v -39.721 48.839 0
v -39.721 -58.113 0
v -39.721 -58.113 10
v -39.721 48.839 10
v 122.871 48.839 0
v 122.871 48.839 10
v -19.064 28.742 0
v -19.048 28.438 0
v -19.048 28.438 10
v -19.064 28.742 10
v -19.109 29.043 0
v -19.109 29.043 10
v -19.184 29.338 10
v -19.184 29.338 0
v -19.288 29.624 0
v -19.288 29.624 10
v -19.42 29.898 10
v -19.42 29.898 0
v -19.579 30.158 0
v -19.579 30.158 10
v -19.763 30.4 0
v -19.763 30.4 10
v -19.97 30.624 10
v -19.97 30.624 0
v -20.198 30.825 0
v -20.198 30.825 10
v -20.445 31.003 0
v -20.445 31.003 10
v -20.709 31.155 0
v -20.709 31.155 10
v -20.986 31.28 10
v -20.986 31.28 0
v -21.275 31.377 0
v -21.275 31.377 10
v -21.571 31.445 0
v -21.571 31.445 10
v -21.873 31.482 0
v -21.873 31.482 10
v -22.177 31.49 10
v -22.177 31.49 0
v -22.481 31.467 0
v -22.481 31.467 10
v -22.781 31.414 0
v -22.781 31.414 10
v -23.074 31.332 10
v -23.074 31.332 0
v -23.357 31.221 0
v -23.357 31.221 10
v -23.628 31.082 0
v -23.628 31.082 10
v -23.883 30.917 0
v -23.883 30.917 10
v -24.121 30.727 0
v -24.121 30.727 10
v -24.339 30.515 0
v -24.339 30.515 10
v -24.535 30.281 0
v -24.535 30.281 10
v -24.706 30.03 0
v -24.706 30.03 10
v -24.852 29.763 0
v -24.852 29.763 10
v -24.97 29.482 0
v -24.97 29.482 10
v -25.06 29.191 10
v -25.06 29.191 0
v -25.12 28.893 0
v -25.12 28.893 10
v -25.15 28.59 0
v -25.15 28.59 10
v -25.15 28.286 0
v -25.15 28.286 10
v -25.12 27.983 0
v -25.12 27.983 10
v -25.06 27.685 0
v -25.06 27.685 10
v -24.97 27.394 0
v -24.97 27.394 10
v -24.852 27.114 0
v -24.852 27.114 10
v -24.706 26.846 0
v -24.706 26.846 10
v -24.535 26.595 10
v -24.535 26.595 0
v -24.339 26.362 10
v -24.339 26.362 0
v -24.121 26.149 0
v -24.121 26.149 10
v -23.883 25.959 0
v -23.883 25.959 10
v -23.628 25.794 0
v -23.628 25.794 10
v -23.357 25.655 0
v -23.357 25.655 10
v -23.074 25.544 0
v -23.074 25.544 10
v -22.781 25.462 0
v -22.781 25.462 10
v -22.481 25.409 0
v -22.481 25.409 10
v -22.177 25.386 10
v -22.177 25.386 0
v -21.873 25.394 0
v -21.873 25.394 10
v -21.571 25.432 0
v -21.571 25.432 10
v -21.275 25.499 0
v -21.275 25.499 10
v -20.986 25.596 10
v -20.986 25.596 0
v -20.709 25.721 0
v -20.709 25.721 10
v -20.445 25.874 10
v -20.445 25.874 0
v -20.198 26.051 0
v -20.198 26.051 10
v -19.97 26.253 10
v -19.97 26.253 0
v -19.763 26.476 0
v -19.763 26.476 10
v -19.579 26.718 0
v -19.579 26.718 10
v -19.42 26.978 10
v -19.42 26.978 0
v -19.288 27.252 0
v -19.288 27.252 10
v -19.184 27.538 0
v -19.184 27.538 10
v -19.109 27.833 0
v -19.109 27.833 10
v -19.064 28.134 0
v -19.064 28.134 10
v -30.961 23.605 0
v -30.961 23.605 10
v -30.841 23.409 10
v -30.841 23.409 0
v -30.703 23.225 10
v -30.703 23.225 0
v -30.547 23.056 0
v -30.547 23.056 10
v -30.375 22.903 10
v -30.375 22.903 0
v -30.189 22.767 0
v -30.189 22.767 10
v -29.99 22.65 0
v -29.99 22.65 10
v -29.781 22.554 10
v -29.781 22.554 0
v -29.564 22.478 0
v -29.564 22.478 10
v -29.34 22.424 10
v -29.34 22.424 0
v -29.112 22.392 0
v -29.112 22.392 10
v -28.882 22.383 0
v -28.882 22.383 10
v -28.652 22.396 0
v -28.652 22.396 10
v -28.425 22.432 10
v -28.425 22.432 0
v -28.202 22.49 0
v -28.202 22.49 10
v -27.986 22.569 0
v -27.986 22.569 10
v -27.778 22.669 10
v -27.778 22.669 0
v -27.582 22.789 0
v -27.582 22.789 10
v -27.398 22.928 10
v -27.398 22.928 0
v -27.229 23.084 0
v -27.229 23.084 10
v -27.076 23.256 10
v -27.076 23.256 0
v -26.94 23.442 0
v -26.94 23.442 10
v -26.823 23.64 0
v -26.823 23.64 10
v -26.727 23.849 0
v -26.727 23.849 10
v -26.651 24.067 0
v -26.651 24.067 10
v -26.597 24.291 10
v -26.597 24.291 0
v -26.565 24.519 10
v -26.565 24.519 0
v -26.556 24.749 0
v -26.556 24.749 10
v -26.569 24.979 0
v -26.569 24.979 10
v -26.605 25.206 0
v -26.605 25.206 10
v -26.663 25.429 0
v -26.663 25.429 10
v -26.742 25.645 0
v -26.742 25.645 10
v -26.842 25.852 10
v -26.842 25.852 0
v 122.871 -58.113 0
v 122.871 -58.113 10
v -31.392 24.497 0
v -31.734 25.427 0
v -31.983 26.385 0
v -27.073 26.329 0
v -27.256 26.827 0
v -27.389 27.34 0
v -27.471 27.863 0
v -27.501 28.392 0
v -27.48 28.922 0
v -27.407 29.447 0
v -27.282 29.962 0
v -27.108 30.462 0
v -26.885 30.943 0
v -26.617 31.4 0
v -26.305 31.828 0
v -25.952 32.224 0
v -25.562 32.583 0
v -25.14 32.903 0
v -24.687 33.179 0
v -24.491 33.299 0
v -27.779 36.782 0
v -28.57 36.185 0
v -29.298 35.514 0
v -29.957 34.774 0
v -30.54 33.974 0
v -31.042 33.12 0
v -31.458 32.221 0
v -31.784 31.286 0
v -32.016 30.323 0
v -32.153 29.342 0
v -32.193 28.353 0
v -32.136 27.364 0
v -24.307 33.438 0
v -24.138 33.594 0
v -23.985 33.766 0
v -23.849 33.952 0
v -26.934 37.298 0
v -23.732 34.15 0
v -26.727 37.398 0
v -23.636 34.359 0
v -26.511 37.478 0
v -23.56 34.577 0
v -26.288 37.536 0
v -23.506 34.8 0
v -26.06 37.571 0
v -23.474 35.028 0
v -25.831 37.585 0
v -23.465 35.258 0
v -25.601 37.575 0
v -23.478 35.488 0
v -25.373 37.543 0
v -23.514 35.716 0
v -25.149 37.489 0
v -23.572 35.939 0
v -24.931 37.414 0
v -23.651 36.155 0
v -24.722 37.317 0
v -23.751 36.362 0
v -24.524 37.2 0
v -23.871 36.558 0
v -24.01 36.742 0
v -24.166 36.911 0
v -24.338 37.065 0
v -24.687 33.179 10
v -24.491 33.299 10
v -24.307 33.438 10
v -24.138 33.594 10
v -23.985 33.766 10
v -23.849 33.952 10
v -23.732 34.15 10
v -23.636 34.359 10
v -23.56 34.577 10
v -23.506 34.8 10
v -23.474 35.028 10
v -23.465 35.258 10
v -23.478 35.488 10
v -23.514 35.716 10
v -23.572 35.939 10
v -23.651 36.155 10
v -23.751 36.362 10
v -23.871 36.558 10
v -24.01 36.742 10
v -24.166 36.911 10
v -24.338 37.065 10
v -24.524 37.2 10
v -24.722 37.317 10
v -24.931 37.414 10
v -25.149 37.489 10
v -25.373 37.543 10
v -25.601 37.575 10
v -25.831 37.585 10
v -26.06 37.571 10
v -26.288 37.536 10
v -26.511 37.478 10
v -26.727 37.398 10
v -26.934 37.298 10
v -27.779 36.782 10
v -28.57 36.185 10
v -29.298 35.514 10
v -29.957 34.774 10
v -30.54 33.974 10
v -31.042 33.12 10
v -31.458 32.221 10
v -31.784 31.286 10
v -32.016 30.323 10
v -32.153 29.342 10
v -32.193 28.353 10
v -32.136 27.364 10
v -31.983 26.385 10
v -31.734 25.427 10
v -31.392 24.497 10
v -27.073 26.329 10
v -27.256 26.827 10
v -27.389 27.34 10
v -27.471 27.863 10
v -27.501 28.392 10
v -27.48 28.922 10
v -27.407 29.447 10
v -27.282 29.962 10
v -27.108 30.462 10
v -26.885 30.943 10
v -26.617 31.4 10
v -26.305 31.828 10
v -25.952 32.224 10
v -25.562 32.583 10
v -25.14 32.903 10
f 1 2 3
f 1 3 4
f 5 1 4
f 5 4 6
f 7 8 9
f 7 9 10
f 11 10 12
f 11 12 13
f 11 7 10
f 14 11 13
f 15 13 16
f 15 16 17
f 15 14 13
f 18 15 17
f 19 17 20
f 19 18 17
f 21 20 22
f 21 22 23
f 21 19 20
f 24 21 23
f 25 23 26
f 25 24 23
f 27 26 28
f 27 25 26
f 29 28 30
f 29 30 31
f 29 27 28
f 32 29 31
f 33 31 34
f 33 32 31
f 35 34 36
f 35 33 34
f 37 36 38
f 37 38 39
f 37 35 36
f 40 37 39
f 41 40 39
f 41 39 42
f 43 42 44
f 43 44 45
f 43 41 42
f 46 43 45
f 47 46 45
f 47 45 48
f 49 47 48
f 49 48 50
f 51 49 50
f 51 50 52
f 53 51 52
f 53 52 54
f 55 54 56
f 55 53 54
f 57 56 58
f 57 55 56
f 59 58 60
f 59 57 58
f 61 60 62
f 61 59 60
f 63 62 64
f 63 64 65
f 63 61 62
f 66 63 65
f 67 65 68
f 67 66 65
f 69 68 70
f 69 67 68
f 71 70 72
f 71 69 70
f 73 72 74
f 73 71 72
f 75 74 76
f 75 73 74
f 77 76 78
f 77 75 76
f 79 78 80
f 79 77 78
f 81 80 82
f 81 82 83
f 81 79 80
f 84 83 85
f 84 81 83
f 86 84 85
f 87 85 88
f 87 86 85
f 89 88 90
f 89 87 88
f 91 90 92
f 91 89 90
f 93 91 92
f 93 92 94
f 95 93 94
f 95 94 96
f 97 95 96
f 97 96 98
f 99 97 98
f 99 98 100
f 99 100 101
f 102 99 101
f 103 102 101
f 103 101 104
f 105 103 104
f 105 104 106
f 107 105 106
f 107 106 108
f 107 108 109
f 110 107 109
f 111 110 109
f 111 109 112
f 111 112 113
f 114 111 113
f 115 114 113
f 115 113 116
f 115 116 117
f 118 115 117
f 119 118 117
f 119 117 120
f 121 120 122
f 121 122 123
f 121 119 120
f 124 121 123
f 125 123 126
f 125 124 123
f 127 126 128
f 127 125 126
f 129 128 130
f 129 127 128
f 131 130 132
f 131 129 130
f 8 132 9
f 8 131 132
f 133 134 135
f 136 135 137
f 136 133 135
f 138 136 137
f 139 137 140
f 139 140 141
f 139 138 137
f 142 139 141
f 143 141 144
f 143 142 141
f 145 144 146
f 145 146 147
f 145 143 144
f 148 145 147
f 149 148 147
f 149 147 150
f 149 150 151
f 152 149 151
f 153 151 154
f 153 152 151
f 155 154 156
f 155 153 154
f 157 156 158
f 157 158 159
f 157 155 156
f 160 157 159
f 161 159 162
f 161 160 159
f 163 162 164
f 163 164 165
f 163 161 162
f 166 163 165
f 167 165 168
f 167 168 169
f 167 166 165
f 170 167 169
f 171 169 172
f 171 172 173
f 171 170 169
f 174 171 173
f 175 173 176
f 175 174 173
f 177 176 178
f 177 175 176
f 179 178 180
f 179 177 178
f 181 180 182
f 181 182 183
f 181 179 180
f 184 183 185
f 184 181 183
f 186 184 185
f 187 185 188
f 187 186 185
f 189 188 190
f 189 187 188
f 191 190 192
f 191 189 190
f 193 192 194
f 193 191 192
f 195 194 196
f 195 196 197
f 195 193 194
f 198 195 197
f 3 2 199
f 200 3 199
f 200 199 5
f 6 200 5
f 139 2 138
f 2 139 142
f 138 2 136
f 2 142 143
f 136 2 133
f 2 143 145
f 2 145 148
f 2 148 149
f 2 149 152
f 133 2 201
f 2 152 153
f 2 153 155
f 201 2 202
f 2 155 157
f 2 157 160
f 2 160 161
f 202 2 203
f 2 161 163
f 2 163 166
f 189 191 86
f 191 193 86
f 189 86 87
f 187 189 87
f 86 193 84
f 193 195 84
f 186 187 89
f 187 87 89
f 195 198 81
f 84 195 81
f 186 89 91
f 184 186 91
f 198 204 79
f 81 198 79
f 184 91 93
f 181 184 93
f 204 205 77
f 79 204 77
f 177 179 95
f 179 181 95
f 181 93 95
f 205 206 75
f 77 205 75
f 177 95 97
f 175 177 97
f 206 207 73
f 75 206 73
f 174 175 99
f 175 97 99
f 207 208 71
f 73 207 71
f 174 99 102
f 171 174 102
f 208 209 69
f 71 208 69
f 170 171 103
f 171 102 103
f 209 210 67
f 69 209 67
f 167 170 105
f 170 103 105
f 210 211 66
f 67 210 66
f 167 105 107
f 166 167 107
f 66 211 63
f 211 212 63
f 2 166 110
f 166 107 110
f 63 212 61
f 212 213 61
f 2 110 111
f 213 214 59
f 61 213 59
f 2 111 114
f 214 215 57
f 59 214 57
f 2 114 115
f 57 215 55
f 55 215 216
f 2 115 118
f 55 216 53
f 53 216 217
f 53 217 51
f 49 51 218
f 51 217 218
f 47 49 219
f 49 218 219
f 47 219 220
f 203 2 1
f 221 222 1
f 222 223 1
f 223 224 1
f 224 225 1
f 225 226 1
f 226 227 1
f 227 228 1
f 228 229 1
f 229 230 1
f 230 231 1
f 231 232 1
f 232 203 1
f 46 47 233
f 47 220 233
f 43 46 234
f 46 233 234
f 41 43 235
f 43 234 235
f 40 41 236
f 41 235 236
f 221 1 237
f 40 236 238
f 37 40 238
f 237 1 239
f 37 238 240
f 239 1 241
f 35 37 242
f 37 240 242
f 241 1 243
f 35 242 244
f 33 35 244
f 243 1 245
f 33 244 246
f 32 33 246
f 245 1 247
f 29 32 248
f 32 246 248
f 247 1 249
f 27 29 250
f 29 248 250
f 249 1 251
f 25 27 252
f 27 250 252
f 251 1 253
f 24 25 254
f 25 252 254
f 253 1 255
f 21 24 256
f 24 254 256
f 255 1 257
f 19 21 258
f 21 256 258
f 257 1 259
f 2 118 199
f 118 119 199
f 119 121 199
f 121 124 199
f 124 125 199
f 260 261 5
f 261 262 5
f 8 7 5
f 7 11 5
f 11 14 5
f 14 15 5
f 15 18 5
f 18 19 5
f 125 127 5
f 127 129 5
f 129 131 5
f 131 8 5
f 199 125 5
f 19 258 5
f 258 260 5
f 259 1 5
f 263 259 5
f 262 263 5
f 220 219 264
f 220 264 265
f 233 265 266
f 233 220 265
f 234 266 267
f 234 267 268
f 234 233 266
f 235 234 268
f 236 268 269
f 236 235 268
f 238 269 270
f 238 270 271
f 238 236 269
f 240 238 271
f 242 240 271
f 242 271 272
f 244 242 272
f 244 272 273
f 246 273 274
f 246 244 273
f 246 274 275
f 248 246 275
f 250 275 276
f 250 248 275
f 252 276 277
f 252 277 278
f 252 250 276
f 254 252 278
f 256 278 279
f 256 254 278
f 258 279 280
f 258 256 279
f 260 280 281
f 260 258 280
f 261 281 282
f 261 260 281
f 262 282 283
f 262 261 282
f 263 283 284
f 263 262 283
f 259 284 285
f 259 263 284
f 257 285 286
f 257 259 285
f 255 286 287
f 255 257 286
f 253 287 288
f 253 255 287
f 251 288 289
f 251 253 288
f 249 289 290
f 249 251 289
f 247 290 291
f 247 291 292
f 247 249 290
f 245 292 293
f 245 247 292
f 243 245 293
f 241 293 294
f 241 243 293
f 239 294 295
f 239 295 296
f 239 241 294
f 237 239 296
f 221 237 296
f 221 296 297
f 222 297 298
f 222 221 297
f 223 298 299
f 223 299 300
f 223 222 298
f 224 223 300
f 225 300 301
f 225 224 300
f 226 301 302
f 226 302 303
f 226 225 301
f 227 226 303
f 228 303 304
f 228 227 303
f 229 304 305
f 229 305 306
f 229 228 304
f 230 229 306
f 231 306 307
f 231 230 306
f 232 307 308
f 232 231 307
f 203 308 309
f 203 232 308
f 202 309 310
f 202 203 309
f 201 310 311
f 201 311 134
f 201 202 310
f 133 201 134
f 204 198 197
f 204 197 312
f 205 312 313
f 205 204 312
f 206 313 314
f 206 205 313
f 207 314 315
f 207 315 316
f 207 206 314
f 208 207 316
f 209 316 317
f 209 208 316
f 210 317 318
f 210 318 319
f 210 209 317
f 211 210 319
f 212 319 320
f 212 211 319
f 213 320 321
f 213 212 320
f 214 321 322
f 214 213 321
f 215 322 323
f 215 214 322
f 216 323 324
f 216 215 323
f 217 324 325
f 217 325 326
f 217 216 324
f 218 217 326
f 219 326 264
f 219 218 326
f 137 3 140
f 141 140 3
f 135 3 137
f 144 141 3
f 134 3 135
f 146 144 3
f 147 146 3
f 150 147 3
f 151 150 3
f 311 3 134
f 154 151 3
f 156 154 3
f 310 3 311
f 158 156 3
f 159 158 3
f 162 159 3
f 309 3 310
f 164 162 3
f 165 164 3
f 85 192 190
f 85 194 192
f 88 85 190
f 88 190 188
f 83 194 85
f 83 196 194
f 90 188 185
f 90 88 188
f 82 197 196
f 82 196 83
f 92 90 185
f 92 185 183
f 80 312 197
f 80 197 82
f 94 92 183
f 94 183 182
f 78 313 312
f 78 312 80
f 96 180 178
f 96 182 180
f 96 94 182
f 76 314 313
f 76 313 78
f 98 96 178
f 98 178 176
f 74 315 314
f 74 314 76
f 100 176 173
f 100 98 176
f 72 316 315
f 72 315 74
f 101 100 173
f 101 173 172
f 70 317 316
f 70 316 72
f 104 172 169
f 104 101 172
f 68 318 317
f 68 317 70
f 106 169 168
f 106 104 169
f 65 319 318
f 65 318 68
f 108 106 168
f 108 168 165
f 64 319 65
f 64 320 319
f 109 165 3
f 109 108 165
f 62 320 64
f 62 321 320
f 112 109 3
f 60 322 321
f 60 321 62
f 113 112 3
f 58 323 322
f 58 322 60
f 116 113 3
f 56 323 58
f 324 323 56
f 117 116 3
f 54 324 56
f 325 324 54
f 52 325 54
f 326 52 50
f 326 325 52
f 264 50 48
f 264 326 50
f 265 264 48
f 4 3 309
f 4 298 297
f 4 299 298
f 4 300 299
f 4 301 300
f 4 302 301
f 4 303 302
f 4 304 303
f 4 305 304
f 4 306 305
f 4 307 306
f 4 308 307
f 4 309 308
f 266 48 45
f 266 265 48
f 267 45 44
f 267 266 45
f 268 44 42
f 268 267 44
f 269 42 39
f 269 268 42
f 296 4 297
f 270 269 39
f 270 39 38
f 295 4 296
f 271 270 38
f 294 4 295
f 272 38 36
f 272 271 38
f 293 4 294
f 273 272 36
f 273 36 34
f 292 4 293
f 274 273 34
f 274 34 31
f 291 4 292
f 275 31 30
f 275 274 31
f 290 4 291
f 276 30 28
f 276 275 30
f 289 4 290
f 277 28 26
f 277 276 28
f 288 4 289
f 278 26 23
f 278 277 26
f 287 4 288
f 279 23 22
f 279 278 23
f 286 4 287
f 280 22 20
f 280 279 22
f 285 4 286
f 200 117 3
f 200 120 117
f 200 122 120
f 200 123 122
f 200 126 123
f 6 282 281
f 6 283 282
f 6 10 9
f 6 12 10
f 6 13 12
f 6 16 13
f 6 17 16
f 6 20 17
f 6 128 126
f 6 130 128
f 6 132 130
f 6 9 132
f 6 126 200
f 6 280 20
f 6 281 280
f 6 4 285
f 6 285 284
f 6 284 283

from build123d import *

# Parameters (mm, degrees)
F_1_FR_W        = 162.591921451
F_1_FR_H        = 106.952100423
F_1_FR_R        = 3.052899236
EXTRUDE_1_DEPTH = 10


with BuildPart() as part:
    # Эскиз1_fr → Бобышка-Вытянуть1 (new body)
    with BuildSketch(Plane.XY):
        with Locations((41.575310714, -4.636651753)):
            Rectangle(F_1_FR_W, F_1_FR_H)
        with Locations((-22.101373353, 28.438130748)):
            Circle(F_1_FR_R, mode=Mode.SUBTRACT)
        with BuildLine():
            ThreePointArc((-26.934111294, 37.298150306), (-31.783615034, 31.28584889), (-30.961392911, 23.605392807))
            ThreePointArc((-30.961392911, 23.605392807), (-27.778379385, 22.669212359), (-26.842198936, 25.852225885))
            ThreePointArc((-26.842198936, 25.852225885), (-27.282154135, 29.961889802), (-24.687278216, 33.178956331))
            ThreePointArc((-24.687278216, 33.178956331), (-23.751097767, 36.361969857), (-26.934111294, 37.298150306))
        make_face(mode=Mode.SUBTRACT)
    extrude(amount=EXTRUDE_1_DEPTH)


solid = part.part
